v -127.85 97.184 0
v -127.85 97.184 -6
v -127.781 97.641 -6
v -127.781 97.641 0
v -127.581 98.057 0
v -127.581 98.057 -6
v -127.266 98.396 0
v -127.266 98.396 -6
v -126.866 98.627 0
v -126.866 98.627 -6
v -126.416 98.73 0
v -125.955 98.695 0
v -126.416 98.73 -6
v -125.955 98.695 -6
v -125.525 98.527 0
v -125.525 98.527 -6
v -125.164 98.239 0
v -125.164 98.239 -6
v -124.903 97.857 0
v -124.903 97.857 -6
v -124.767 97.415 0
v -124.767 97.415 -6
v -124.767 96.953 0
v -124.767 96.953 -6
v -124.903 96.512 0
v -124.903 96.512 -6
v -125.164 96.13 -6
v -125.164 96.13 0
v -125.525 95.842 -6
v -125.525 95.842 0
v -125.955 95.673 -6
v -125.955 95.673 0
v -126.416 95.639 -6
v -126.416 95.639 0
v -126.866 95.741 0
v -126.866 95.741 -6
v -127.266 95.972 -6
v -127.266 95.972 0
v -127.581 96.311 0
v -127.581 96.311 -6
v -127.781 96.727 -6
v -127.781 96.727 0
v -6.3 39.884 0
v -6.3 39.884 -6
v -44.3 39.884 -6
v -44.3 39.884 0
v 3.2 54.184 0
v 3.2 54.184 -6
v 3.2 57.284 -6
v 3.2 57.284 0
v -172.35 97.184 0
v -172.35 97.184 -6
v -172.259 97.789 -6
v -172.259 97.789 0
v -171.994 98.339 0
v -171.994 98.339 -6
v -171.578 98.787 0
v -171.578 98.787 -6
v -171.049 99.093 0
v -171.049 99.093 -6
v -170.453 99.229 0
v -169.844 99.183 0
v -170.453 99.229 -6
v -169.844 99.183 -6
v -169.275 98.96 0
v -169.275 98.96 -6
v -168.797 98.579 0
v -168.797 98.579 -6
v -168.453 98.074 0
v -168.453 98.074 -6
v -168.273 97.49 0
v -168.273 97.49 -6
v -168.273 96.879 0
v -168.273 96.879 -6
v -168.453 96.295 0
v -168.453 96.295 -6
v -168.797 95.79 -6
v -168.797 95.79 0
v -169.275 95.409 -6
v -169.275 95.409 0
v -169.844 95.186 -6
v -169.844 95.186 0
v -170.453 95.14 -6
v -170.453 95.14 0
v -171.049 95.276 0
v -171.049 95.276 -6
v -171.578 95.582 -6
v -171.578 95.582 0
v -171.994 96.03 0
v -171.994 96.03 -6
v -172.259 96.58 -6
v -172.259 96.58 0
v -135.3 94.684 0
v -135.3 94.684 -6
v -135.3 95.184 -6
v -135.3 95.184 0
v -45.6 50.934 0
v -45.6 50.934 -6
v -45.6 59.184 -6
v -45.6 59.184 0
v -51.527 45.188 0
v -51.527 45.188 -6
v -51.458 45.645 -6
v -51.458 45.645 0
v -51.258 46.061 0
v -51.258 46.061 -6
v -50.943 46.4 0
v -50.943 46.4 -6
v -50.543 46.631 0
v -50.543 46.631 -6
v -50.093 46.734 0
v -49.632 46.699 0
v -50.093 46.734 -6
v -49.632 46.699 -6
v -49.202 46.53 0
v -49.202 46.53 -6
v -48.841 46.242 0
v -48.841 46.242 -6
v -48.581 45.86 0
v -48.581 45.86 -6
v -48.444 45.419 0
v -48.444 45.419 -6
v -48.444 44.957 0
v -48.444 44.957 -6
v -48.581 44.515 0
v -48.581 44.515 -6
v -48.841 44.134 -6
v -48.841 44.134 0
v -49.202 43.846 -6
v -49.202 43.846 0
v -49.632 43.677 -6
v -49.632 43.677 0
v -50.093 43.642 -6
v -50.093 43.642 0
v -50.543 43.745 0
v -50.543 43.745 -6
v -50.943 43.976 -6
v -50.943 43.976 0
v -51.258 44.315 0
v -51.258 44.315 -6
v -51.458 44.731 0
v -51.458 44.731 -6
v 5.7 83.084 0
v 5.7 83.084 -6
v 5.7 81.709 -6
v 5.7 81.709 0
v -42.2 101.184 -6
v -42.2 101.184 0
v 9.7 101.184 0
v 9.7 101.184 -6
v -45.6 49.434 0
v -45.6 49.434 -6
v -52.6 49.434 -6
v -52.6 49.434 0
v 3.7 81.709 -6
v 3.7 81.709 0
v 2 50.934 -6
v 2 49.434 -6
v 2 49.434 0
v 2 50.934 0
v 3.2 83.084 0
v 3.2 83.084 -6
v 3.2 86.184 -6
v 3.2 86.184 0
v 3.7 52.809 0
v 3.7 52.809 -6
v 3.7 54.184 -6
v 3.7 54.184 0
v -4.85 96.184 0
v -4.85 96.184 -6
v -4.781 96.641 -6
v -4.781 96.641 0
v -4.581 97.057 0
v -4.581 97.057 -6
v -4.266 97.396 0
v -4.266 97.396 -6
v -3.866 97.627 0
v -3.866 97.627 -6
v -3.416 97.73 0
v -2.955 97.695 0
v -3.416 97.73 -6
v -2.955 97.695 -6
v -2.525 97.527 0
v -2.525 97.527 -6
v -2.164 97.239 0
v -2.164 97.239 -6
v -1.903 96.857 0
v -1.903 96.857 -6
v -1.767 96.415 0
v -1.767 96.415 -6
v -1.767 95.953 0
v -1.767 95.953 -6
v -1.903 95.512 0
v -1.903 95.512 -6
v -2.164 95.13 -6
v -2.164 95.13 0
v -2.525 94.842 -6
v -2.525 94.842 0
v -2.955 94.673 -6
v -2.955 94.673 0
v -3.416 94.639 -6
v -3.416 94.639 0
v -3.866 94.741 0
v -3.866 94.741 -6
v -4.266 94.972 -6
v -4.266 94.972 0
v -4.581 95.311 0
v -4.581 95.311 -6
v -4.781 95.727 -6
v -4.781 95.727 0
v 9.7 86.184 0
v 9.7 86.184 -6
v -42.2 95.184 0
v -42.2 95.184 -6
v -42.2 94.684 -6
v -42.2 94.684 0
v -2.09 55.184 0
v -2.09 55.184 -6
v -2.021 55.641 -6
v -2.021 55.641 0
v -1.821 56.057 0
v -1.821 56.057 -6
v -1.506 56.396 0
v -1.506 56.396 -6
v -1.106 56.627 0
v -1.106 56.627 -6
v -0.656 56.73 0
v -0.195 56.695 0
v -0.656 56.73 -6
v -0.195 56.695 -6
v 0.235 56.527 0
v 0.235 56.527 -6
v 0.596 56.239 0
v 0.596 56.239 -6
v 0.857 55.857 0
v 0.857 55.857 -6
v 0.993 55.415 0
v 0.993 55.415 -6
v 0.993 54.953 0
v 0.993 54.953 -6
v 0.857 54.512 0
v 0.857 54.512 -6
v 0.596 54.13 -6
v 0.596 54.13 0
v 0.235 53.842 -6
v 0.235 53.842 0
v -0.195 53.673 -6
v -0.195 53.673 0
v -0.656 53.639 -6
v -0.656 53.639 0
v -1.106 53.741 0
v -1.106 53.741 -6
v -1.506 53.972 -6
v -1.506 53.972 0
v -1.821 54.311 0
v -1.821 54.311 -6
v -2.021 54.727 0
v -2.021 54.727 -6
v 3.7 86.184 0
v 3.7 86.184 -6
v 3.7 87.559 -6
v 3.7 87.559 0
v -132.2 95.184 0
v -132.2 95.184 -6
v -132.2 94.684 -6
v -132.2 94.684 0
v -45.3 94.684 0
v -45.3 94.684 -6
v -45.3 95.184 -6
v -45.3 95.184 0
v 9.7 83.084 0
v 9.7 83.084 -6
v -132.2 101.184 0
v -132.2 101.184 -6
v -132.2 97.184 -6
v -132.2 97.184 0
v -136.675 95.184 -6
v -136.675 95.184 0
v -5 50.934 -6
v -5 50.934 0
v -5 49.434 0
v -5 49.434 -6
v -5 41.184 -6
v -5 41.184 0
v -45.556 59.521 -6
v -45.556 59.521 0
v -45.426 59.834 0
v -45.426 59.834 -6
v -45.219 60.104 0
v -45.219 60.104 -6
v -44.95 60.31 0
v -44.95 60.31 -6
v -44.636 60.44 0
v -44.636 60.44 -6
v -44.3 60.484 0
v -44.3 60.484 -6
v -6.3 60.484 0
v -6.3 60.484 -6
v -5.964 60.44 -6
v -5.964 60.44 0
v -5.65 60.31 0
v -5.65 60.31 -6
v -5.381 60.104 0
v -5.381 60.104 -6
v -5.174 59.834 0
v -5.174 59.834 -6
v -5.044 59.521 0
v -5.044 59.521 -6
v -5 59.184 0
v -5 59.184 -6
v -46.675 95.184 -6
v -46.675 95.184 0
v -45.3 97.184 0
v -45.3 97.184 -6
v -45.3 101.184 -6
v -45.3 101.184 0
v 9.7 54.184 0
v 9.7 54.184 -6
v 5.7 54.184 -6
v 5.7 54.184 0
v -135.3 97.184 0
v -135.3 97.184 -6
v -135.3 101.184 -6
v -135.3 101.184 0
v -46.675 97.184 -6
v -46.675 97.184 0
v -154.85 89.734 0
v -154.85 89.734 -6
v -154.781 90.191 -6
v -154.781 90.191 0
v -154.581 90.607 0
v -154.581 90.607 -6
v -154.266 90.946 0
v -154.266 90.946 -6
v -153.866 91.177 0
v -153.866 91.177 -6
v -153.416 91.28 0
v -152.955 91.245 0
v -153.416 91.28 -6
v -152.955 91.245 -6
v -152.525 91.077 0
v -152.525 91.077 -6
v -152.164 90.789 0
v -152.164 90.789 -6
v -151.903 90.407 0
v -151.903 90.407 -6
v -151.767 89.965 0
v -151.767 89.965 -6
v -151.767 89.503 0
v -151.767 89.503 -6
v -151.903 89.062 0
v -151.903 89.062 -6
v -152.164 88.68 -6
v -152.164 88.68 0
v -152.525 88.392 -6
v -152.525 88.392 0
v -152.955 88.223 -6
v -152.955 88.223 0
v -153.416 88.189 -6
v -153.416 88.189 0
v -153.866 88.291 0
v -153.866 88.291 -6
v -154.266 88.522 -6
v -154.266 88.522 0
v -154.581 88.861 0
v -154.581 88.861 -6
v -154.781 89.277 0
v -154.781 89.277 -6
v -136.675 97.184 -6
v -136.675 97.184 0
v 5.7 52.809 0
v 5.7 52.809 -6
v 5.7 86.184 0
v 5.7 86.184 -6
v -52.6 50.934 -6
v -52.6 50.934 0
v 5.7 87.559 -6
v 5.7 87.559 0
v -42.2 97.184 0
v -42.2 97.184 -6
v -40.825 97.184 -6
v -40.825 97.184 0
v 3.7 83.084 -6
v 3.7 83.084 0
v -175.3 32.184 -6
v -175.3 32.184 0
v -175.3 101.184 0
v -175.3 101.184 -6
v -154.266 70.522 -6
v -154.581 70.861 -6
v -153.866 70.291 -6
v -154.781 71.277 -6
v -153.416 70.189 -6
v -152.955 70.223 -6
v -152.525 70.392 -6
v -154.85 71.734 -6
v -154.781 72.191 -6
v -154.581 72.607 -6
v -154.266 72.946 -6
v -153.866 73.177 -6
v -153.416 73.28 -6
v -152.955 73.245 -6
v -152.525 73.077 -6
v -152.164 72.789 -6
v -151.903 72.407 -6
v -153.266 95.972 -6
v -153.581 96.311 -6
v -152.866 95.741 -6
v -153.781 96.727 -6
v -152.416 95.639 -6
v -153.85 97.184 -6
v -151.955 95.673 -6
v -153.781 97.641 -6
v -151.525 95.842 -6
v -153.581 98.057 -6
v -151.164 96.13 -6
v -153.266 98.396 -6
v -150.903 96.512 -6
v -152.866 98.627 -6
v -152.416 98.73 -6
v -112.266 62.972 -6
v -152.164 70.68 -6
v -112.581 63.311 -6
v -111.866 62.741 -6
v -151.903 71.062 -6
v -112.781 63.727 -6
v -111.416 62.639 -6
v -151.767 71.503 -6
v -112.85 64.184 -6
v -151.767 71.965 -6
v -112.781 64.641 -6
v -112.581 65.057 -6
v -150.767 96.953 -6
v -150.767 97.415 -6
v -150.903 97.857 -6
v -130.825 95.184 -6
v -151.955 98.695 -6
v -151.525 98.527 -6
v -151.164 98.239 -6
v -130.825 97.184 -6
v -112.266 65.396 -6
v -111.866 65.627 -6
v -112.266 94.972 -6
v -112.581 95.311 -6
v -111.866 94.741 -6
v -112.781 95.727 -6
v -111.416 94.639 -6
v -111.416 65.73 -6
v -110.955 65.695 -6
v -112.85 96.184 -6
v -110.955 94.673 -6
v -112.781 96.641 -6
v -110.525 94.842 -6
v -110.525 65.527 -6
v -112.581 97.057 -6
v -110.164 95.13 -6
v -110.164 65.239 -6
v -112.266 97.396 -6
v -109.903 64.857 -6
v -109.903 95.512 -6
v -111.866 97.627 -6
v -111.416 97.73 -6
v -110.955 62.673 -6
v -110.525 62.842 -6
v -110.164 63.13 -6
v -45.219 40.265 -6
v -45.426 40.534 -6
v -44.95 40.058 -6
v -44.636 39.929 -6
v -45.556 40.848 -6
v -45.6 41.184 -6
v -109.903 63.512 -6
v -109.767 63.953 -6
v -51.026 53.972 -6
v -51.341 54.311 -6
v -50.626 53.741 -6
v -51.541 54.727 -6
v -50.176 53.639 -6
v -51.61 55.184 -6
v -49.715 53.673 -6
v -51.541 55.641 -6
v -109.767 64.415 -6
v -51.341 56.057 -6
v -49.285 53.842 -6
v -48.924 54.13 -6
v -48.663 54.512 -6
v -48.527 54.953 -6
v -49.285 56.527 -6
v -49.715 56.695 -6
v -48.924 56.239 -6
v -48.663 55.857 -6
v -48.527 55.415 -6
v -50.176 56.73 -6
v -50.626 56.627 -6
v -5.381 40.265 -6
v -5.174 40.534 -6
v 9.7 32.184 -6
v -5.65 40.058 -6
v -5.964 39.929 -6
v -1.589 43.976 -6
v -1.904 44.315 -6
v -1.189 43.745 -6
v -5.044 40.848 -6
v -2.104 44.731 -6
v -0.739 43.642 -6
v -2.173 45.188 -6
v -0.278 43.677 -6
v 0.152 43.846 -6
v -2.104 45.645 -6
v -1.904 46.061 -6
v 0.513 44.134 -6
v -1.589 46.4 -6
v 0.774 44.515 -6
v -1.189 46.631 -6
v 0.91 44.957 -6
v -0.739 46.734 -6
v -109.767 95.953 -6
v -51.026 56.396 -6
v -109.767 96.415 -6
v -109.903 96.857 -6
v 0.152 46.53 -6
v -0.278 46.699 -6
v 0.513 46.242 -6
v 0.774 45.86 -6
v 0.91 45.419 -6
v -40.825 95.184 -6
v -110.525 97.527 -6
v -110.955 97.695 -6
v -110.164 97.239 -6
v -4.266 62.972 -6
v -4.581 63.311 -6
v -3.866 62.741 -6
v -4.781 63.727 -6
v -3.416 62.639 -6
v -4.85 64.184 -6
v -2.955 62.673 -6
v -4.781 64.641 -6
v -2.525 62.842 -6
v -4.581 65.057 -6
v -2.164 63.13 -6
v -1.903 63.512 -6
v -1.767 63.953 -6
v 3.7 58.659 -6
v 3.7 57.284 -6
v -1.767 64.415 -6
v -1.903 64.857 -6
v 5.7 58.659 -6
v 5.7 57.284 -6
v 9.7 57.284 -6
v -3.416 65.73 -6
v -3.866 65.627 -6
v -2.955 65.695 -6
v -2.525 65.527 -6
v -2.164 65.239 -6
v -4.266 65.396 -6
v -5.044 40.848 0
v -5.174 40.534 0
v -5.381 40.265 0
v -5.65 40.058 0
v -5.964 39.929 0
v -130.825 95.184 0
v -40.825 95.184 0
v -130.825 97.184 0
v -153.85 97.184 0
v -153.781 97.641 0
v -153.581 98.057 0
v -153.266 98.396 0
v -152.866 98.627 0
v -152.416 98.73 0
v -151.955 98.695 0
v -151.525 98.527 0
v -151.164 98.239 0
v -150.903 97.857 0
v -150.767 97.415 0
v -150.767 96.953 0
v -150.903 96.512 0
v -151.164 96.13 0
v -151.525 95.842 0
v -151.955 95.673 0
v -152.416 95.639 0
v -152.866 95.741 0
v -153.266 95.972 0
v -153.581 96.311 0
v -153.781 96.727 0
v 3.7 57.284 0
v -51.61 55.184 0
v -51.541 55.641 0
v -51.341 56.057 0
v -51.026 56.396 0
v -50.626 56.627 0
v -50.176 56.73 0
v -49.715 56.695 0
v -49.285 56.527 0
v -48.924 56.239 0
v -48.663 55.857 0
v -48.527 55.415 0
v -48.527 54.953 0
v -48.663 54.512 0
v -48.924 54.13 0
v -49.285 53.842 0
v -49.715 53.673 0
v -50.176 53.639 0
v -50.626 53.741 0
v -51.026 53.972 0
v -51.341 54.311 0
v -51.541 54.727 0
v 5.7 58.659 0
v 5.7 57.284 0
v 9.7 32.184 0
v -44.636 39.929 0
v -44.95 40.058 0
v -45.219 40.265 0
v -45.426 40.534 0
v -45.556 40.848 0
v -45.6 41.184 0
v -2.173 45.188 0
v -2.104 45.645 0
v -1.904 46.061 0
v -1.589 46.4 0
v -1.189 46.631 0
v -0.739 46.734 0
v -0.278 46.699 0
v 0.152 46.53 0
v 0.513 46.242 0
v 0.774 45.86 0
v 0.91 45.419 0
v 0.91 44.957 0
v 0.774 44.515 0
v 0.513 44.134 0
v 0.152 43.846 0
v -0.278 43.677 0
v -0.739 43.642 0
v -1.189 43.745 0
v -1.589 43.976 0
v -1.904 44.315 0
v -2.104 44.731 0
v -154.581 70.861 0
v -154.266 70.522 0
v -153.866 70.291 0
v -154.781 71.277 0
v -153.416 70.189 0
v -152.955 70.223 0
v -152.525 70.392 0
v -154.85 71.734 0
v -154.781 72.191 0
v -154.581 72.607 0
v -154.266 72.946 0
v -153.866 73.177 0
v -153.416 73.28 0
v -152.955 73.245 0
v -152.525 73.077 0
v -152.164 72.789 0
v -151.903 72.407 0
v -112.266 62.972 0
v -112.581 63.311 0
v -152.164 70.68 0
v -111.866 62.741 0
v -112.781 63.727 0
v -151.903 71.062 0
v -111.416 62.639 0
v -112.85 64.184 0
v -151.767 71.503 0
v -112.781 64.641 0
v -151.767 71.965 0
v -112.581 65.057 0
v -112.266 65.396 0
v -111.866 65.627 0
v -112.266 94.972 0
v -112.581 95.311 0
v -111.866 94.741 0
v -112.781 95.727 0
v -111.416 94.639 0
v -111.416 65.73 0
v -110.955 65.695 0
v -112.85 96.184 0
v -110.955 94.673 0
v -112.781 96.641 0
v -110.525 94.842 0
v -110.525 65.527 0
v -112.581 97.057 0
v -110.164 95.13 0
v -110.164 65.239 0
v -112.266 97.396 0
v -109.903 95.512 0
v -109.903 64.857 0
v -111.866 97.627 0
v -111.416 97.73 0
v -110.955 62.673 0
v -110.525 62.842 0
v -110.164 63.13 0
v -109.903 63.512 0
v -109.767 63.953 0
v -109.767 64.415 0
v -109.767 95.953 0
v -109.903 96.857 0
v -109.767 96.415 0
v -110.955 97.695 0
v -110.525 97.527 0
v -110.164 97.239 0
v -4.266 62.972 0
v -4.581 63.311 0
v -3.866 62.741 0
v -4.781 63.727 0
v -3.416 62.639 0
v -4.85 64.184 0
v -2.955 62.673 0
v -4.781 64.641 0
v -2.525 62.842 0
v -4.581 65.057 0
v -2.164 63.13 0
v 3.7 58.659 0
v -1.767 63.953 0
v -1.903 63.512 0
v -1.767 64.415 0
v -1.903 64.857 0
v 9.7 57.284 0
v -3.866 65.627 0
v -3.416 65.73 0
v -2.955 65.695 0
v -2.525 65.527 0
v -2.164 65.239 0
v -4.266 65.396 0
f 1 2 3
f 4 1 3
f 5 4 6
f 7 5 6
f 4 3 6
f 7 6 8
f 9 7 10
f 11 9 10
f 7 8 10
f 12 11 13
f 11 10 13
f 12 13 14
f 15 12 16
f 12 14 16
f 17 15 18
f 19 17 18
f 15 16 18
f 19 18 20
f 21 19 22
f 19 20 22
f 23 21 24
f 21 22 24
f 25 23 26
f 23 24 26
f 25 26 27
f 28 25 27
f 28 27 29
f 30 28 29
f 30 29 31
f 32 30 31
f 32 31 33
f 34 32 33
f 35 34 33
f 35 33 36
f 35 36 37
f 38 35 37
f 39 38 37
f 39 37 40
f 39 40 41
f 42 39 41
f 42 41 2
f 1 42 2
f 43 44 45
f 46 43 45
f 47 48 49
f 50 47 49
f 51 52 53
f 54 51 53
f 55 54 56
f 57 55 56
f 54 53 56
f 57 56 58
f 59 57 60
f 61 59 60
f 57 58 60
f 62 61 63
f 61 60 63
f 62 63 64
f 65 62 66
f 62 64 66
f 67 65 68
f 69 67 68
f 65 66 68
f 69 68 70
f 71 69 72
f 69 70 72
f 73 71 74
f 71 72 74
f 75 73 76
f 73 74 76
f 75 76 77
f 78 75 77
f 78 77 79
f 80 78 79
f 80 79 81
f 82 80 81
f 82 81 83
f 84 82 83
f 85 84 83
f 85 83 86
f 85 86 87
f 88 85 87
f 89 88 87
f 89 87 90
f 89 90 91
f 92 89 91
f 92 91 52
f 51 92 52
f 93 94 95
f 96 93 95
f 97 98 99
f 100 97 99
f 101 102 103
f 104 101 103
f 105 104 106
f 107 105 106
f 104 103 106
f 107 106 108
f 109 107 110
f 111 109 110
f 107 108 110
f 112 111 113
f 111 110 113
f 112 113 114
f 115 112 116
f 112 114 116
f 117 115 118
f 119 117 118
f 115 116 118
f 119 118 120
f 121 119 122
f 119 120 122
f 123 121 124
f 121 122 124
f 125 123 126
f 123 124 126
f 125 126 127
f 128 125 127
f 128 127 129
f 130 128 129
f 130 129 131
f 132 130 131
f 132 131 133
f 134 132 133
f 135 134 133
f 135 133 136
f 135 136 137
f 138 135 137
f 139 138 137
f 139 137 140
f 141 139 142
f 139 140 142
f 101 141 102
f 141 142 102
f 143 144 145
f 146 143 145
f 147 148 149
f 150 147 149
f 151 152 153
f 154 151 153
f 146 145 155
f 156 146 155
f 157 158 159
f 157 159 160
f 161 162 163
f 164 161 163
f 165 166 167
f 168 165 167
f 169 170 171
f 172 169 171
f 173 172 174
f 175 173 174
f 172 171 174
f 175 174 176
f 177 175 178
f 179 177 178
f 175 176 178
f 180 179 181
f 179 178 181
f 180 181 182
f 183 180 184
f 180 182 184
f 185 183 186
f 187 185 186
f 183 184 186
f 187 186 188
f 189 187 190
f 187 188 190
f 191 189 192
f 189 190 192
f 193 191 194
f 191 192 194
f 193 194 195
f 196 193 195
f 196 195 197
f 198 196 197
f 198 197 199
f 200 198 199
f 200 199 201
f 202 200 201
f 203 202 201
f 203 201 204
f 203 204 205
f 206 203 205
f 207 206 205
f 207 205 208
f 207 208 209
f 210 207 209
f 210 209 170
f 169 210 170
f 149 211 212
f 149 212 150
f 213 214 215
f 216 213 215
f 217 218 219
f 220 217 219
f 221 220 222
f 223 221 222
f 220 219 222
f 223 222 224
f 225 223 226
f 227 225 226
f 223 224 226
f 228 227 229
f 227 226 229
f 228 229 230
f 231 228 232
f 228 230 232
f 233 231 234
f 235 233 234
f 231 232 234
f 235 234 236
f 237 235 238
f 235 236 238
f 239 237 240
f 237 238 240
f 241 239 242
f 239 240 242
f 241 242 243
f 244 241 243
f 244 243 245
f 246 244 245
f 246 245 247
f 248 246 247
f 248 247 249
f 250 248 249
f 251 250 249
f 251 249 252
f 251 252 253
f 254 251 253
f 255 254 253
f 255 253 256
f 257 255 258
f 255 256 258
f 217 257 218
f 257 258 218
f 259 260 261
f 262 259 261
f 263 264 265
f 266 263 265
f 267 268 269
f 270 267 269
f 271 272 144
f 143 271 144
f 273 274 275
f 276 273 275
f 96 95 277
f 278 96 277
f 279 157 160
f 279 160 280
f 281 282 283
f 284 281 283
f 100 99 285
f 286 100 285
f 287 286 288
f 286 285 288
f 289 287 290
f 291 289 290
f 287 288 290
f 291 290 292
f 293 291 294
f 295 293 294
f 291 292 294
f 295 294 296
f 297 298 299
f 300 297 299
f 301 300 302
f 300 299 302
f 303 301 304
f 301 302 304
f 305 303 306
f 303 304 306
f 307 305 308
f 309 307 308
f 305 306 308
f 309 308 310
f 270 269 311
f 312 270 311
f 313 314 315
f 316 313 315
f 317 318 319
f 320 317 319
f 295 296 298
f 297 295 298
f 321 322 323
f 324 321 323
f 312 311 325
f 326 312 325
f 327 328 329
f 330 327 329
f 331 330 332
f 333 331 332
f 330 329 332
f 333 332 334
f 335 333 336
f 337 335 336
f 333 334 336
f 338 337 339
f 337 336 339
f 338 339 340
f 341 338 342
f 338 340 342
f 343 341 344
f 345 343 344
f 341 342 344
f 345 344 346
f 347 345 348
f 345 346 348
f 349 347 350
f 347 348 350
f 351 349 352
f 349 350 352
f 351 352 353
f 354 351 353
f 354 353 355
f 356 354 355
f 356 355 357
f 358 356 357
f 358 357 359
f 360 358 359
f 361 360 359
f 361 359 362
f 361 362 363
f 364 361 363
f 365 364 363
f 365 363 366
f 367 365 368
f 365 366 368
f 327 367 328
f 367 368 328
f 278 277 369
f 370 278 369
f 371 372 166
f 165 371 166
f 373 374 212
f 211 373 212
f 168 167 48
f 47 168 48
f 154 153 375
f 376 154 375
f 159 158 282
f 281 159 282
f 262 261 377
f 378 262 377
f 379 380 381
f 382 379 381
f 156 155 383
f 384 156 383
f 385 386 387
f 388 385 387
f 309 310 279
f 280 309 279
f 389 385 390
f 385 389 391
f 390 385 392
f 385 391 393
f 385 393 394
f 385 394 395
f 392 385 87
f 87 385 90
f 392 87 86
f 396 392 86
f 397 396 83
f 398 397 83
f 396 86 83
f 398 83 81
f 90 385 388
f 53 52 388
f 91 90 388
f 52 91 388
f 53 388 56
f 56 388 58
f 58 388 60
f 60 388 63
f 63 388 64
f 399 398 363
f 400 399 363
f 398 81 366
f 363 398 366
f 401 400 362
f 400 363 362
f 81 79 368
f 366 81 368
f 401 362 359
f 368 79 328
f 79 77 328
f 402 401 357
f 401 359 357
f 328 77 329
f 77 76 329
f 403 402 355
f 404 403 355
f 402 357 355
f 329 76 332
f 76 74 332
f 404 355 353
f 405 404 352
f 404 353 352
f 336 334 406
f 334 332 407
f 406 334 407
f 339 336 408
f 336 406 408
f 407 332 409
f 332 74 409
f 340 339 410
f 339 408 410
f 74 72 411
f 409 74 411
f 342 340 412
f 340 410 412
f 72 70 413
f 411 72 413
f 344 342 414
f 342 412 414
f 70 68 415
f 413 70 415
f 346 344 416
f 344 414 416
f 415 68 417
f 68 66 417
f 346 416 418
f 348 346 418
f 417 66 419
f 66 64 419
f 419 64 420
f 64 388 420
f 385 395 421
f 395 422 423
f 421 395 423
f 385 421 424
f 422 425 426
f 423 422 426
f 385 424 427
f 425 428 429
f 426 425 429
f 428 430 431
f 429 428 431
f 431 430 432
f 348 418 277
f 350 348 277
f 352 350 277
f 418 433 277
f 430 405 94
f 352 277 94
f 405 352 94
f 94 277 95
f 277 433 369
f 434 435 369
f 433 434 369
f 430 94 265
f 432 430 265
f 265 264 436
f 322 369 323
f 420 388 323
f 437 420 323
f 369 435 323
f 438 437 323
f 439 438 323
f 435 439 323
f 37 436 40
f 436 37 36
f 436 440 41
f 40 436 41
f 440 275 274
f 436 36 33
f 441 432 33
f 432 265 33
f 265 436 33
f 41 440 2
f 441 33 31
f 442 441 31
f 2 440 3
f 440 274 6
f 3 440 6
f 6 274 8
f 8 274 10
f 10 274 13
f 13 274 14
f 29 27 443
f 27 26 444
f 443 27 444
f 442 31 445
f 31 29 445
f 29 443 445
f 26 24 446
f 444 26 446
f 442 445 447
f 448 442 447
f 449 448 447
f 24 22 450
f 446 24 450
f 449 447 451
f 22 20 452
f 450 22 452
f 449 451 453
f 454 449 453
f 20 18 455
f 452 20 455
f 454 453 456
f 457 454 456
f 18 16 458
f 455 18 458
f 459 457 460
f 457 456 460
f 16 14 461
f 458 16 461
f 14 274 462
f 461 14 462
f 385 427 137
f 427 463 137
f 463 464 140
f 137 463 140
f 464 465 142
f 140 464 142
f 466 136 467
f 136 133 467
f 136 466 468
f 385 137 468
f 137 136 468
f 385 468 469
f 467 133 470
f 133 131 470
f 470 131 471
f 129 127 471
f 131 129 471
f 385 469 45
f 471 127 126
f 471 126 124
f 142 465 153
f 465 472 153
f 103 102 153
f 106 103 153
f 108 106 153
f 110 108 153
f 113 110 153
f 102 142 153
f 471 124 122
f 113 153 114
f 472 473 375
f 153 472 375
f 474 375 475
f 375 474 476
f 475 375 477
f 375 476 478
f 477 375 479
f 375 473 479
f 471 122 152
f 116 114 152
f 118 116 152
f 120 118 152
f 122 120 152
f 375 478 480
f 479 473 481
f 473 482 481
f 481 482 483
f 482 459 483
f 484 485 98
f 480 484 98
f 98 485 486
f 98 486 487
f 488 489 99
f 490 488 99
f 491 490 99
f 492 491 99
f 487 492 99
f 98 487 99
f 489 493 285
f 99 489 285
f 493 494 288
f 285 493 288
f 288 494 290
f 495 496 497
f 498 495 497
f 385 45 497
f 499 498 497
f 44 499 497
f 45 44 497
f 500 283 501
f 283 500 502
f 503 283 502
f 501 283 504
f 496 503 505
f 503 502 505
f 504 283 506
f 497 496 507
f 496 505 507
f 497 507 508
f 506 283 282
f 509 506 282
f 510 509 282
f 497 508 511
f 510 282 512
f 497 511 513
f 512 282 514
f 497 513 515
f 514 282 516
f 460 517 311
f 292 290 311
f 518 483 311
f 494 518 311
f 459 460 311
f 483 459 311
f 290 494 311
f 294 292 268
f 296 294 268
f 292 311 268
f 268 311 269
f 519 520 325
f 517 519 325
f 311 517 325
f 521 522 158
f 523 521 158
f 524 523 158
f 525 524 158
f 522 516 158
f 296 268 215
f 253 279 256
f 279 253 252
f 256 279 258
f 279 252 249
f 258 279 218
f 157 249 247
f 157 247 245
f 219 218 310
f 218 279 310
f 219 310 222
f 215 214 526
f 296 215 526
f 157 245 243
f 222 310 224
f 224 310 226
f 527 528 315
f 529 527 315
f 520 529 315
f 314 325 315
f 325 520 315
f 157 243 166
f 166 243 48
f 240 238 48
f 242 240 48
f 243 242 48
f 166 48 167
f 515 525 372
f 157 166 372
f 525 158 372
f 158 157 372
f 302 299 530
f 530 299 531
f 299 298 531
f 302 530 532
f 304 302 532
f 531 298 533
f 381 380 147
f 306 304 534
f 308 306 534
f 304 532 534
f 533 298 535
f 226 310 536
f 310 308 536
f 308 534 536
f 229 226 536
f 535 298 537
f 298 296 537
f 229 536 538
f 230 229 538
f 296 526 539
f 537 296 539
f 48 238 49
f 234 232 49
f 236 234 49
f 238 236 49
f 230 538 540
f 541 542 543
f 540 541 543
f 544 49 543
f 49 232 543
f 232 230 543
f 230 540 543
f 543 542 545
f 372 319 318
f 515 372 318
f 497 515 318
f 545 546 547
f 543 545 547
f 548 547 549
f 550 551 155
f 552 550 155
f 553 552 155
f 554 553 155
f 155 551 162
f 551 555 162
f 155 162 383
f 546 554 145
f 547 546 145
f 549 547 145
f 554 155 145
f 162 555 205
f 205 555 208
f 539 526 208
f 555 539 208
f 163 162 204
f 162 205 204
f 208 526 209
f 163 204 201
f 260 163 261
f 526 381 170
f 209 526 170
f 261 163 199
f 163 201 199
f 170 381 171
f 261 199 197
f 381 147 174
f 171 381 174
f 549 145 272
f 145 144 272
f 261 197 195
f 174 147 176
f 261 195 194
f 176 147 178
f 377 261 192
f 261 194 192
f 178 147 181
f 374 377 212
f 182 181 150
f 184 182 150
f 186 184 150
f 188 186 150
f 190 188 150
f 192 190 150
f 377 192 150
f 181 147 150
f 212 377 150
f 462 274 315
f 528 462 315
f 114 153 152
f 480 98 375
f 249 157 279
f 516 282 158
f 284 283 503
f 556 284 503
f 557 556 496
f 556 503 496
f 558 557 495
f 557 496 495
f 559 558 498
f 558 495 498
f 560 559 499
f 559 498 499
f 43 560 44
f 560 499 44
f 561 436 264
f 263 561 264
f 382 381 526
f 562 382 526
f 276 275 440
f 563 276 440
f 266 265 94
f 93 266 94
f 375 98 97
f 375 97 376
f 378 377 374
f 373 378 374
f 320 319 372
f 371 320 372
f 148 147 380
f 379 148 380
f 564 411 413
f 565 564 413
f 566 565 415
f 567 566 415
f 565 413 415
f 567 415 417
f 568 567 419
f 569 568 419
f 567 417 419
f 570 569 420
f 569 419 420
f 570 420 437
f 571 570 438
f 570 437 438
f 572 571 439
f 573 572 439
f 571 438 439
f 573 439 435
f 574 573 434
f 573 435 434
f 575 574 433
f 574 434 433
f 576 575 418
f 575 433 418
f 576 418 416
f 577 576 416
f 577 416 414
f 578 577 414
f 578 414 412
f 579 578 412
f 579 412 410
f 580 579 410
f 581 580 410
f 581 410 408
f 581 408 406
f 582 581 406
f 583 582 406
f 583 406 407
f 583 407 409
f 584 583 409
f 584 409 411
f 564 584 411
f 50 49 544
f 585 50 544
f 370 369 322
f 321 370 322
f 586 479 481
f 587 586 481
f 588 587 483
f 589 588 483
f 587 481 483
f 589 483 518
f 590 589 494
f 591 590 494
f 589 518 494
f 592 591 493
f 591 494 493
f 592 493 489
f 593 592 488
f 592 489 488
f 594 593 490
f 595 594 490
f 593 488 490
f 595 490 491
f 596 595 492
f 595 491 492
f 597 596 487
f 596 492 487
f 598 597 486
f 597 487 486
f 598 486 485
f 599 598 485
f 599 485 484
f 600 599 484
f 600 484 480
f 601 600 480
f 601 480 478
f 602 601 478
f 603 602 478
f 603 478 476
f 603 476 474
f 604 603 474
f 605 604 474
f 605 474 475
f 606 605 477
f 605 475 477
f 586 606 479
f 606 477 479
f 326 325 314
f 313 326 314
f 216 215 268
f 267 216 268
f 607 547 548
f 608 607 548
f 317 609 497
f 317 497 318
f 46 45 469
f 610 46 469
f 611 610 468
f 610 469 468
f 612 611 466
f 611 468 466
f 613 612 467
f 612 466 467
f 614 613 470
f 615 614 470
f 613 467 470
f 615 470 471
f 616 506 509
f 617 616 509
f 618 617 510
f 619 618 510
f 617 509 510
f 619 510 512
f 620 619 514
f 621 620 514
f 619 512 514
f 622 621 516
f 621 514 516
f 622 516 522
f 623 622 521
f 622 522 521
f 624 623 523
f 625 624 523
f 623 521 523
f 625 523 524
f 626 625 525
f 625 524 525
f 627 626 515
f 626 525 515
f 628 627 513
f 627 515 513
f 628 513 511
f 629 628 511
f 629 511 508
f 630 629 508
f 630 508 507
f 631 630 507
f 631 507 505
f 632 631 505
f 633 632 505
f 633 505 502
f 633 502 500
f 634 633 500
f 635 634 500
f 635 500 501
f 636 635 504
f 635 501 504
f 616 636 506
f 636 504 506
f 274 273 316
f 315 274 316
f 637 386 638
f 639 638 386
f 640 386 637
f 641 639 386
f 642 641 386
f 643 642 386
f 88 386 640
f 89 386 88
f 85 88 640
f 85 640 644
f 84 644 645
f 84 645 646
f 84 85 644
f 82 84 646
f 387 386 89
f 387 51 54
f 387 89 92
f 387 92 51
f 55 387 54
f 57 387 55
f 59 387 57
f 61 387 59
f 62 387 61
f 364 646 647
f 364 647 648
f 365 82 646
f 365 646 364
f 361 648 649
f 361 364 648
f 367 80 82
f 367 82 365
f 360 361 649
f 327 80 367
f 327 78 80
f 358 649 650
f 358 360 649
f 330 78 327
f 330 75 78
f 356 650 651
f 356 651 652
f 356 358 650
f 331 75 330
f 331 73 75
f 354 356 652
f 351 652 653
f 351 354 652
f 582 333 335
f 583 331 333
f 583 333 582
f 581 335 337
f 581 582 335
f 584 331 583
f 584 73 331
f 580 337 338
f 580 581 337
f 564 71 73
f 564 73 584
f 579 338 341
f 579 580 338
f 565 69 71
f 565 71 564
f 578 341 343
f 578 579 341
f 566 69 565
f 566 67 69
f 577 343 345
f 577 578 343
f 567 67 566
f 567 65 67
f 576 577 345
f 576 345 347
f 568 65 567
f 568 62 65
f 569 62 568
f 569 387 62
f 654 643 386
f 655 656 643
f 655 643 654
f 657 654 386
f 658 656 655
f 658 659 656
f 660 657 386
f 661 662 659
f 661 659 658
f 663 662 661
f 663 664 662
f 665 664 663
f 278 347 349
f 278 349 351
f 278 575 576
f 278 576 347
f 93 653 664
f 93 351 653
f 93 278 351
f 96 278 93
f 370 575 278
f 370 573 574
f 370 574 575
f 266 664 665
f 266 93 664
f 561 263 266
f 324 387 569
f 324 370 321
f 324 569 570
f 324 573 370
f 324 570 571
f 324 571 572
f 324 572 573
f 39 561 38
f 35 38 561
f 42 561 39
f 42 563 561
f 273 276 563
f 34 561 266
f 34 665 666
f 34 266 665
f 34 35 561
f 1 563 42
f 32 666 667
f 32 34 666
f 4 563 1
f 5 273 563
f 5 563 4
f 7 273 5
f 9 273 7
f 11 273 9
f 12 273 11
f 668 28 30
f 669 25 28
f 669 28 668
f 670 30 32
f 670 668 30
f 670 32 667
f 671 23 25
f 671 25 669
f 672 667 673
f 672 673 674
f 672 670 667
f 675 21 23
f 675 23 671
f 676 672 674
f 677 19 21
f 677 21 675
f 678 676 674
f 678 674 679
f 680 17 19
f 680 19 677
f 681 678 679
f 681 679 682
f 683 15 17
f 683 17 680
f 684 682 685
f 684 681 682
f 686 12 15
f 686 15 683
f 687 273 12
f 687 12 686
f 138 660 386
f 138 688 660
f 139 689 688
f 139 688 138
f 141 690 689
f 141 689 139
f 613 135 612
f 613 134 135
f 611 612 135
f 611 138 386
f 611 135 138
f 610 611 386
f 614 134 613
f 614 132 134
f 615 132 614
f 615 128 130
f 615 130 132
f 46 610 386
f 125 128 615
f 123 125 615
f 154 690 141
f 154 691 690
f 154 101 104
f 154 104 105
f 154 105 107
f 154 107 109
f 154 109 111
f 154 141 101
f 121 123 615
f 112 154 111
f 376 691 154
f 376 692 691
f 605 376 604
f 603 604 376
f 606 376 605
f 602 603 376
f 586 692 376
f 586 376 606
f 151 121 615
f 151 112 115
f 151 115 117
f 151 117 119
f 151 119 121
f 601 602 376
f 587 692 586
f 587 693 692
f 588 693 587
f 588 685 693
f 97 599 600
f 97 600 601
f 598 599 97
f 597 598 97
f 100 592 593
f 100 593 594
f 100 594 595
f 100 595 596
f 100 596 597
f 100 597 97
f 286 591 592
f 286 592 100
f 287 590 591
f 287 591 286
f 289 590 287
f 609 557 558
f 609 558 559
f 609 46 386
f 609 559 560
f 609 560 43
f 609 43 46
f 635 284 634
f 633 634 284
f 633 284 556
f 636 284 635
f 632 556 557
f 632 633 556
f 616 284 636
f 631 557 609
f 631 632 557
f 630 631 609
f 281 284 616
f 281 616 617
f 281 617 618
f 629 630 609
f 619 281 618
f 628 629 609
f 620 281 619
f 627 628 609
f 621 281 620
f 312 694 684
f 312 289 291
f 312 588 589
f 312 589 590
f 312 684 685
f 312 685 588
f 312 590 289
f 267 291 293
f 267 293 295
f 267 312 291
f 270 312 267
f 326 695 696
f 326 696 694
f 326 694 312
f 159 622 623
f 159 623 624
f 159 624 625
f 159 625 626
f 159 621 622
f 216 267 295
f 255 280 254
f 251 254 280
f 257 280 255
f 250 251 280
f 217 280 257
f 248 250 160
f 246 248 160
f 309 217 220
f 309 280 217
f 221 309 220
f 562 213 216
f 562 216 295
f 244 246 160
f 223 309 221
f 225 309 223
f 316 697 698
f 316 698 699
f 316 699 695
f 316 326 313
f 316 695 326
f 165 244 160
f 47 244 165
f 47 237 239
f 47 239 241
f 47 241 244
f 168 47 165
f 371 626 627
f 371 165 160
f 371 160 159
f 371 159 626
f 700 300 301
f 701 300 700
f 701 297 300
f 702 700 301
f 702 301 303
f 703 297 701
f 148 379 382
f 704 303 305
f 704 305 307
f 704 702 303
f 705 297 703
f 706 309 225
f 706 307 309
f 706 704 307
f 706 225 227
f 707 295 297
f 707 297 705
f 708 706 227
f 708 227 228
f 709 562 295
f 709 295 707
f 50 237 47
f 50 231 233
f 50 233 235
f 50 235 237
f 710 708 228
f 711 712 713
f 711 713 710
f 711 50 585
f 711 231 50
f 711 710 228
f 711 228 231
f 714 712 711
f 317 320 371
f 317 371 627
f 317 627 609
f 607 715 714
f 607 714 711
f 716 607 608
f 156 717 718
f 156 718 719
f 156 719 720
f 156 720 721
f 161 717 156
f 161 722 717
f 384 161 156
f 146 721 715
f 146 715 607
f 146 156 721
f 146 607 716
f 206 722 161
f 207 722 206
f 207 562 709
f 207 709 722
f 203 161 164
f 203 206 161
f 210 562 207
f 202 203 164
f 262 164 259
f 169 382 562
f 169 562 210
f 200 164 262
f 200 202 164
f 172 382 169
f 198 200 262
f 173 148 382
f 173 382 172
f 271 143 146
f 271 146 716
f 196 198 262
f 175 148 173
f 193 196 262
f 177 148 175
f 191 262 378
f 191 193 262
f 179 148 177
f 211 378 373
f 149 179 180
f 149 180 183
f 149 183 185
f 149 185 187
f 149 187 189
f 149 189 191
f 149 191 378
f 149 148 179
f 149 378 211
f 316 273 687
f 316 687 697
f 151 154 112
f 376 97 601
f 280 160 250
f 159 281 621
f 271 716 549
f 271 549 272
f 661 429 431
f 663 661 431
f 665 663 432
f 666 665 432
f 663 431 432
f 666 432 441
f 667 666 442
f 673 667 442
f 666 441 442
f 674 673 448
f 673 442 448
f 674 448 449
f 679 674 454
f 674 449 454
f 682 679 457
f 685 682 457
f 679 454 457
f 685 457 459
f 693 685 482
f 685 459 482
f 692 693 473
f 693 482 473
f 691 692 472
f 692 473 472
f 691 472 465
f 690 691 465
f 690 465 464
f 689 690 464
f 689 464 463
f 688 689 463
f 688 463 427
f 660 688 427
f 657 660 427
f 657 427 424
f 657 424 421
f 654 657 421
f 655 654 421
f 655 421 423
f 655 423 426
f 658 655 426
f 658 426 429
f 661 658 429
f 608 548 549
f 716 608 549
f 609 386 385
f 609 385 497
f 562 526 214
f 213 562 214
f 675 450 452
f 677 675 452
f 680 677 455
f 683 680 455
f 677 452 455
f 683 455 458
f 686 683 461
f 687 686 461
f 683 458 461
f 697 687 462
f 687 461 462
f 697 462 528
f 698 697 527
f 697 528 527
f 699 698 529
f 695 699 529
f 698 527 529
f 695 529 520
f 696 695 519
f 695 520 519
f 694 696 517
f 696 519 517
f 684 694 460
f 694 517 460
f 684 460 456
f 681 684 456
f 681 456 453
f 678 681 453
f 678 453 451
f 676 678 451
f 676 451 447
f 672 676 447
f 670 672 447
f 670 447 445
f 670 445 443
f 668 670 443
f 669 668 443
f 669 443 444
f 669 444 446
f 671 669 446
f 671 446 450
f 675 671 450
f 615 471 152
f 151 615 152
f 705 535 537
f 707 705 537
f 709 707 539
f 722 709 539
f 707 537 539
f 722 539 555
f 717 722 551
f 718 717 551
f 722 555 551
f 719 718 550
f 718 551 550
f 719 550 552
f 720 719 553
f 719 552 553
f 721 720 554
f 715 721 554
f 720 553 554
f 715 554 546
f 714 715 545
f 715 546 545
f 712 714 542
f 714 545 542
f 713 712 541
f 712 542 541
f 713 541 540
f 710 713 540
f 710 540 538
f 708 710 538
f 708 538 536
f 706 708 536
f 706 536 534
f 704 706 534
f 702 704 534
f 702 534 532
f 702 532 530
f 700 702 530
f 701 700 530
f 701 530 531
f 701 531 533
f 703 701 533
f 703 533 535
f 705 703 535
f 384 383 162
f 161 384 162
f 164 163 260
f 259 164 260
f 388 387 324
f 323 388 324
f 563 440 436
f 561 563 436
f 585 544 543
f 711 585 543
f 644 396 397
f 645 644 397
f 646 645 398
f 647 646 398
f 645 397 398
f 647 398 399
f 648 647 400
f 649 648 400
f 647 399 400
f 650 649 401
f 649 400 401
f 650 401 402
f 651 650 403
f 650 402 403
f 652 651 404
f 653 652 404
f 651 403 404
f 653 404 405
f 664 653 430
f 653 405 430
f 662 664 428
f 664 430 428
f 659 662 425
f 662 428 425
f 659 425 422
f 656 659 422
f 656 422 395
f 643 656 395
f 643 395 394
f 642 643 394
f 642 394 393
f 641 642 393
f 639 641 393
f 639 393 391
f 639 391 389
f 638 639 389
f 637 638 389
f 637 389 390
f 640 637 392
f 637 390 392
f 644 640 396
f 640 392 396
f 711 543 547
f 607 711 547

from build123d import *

# Parameters (mm, degrees)
SZKIC1_W                    = 185
SZKIC1_H                    = 69
DODANIE_WYCI_GNI_CIE1_DEPTH = 6
WYTNIJ_WYCI_GNI_CIE2_DEPTH  = 203.495320778
SZYK_LINIOWY1_COUNT         = 2
SZYK_LINIOWY1_PITCH         = 90
WYTNIJ_WYCI_GNI_CIE3_DEPTH  = 203.495320778
SZYK_LINIOWY2_COUNT         = 2
SZYK_LINIOWY2_PITCH         = 28.9
SZKIC8_R                    = 1.55
WYTNIJ_WYCI_GNI_CIE4_DEPTH  = 203.495320778
SZKIC11_R                   = 2.05
SZKIC11_R_2                 = 1.55
WYTNIJ_WYCI_GNI_CIE7_DEPTH  = 10
SZKIC13_R                   = 1.55
WYTNIJ_WYCI_GNI_CIE8_DEPTH  = 6
SZKIC14_W                   = 7
SZKIC14_H                   = 1.5
WYTNIJ_WYCI_GNI_CIE9_DEPTH  = 10
SZKIC16_R                   = 1.55
WYTNIJ_WYCI_GNI_CIE10_DEPTH = 6


with BuildPart() as part:
    # Szkic1 → Dodanie-wyciągnięcie1 (new body)
    with BuildSketch(Plane.XY):
        with Locations((-82.8, 66.684311715)):
            Rectangle(SZKIC1_W, SZKIC1_H)
    extrude(amount=-DODANIE_WYCI_GNI_CIE1_DEPTH)

    # Szkic6 → Wytnij-wyciągnięcie2 (cut, through all)
    with BuildSketch(Plane(origin=(0, 0, -6), x_dir=(-1, 0, 0), z_dir=(0, 0, -1))):
        Polygon((135.3, 101.184311715), (132.2, 101.184311715), (132.2, 97.184311715), (130.825, 97.184311715), (130.825, 95.184311715), (132.2, 95.184311715), (132.2, 94.684311715), (135.3, 94.684311715), (135.3, 95.184311715), (136.675, 95.184311715), (136.675, 97.184311715), (135.3, 97.184311715), align=None)
    wytnij_wyci_gni_cie2 = extrude(amount=-WYTNIJ_WYCI_GNI_CIE2_DEPTH, mode=Mode.SUBTRACT)

    # Szyk liniowy1: Wytnij-wyciągnięcie2 ×2
    with Locations(*[(i * SZYK_LINIOWY1_PITCH, 0, 0) for i in range(1, SZYK_LINIOWY1_COUNT)]):
        add(wytnij_wyci_gni_cie2, mode=Mode.SUBTRACT)

    # Szkic7 → Wytnij-wyciągnięcie3 (cut, through all)
    with BuildSketch(Plane(origin=(0, 0, -6), x_dir=(-1, 0, 0), z_dir=(0, 0, -1))):
        Polygon((-9.7, 86.184311715), (-9.7, 83.084311715), (-5.7, 83.084311715), (-5.7, 81.709311715), (-3.7, 81.709311715), (-3.7, 83.084311715), (-3.2, 83.084311715), (-3.2, 86.184311715), (-3.7, 86.184311715), (-3.7, 87.559311715), (-5.7, 87.559311715), (-5.7, 86.184311715), align=None)
    wytnij_wyci_gni_cie3 = extrude(amount=-WYTNIJ_WYCI_GNI_CIE3_DEPTH, mode=Mode.SUBTRACT)

    # Szyk liniowy2: Wytnij-wyciągnięcie3 ×2
    with Locations(*[(0, -i * SZYK_LINIOWY2_PITCH, 0) for i in range(1, SZYK_LINIOWY2_COUNT)]):
        add(wytnij_wyci_gni_cie3, mode=Mode.SUBTRACT)

    # Szkic8 → Wytnij-wyciągnięcie4 (cut, through all)
    with BuildSketch(Plane(origin=(0, 0, -6), x_dir=(-1, 0, 0), z_dir=(0, 0, -1))):
        with Locations((111.3, 96.184311715)):
            Circle(SZKIC8_R)
        with Locations((111.3, 64.184311715)):
            Circle(SZKIC8_R)
        with Locations((3.3, 64.184311715)):
            Circle(SZKIC8_R)
        with Locations((3.3, 96.184311715)):
            Circle(SZKIC8_R)
    extrude(amount=-WYTNIJ_WYCI_GNI_CIE4_DEPTH, mode=Mode.SUBTRACT)

    # Szkic11 → Wytnij-wyciągnięcie7 (cut)
    with BuildSketch(Plane(origin=(0, 0, -6), x_dir=(-1, 0, 0), z_dir=(0, 0, -1))):
        with Locations((170.3, 97.184311715)):
            Circle(SZKIC11_R)
        with Locations((152.3, 97.184311715)):
            Circle(SZKIC11_R_2)
        with Locations((126.3, 97.184311715)):
            Circle(SZKIC11_R_2)
    extrude(amount=-WYTNIJ_WYCI_GNI_CIE7_DEPTH, mode=Mode.SUBTRACT)

    # Szkic13 → Wytnij-wyciągnięcie8 (cut)
    with BuildSketch(Plane(origin=(0, 0, -6), x_dir=(-1, 0, 0), z_dir=(0, 0, -1))):
        with Locations((49.977029411, 45.18796276)):
            Circle(SZKIC13_R)
        with Locations((50.06, 55.184311715)):
            Circle(SZKIC13_R)
        with Locations((0.54, 55.184311715)):
            Circle(SZKIC13_R)
        with Locations((0.622970589, 45.18796276)):
            Circle(SZKIC13_R)
        with BuildLine():
            Line((6.3, 39.884311715), (44.3, 39.884311715))
            ThreePointArc((44.3, 39.884311715), (45.219238816, 40.265072899), (45.6, 41.184311715))
            Line((45.6, 41.184311715), (45.6, 59.184311715))
            ThreePointArc((45.6, 59.184311715), (45.219238816, 60.10355053), (44.3, 60.484311715))
            Line((44.3, 60.484311715), (6.3, 60.484311715))
            ThreePointArc((6.3, 60.484311715), (5.380761184, 60.10355053), (5, 59.184311715))
            Line((5, 59.184311715), (5, 41.184311715))
            ThreePointArc((5, 41.184311715), (5.380761184, 40.265072899), (6.3, 39.884311715))
        make_face()
    extrude(amount=-WYTNIJ_WYCI_GNI_CIE8_DEPTH, mode=Mode.SUBTRACT)

    # Szkic14 → Wytnij-wyciągnięcie9 (cut)
    with BuildSketch(Plane(origin=(0, 0, -6), x_dir=(-1, 0, 0), z_dir=(0, 0, -1))):
        with Locations((49.1, 50.184311715)):
            Rectangle(SZKIC14_W, SZKIC14_H)
        with Locations((1.5, 50.184311715)):
            Rectangle(SZKIC14_W, SZKIC14_H)
    extrude(amount=-WYTNIJ_WYCI_GNI_CIE9_DEPTH, mode=Mode.SUBTRACT)

    # Szkic16 → Wytnij-wyciągnięcie10 (cut)
    with BuildSketch(Plane(origin=(0, 0, -6), x_dir=(-1, 0, 0), z_dir=(0, 0, -1))):
        with Locations((153.3, 89.734311715)):
            Circle(SZKIC16_R)
        with Locations((153.3, 71.734311715)):
            Circle(SZKIC16_R)
    extrude(amount=-WYTNIJ_WYCI_GNI_CIE10_DEPTH, mode=Mode.SUBTRACT)


solid = part.part
